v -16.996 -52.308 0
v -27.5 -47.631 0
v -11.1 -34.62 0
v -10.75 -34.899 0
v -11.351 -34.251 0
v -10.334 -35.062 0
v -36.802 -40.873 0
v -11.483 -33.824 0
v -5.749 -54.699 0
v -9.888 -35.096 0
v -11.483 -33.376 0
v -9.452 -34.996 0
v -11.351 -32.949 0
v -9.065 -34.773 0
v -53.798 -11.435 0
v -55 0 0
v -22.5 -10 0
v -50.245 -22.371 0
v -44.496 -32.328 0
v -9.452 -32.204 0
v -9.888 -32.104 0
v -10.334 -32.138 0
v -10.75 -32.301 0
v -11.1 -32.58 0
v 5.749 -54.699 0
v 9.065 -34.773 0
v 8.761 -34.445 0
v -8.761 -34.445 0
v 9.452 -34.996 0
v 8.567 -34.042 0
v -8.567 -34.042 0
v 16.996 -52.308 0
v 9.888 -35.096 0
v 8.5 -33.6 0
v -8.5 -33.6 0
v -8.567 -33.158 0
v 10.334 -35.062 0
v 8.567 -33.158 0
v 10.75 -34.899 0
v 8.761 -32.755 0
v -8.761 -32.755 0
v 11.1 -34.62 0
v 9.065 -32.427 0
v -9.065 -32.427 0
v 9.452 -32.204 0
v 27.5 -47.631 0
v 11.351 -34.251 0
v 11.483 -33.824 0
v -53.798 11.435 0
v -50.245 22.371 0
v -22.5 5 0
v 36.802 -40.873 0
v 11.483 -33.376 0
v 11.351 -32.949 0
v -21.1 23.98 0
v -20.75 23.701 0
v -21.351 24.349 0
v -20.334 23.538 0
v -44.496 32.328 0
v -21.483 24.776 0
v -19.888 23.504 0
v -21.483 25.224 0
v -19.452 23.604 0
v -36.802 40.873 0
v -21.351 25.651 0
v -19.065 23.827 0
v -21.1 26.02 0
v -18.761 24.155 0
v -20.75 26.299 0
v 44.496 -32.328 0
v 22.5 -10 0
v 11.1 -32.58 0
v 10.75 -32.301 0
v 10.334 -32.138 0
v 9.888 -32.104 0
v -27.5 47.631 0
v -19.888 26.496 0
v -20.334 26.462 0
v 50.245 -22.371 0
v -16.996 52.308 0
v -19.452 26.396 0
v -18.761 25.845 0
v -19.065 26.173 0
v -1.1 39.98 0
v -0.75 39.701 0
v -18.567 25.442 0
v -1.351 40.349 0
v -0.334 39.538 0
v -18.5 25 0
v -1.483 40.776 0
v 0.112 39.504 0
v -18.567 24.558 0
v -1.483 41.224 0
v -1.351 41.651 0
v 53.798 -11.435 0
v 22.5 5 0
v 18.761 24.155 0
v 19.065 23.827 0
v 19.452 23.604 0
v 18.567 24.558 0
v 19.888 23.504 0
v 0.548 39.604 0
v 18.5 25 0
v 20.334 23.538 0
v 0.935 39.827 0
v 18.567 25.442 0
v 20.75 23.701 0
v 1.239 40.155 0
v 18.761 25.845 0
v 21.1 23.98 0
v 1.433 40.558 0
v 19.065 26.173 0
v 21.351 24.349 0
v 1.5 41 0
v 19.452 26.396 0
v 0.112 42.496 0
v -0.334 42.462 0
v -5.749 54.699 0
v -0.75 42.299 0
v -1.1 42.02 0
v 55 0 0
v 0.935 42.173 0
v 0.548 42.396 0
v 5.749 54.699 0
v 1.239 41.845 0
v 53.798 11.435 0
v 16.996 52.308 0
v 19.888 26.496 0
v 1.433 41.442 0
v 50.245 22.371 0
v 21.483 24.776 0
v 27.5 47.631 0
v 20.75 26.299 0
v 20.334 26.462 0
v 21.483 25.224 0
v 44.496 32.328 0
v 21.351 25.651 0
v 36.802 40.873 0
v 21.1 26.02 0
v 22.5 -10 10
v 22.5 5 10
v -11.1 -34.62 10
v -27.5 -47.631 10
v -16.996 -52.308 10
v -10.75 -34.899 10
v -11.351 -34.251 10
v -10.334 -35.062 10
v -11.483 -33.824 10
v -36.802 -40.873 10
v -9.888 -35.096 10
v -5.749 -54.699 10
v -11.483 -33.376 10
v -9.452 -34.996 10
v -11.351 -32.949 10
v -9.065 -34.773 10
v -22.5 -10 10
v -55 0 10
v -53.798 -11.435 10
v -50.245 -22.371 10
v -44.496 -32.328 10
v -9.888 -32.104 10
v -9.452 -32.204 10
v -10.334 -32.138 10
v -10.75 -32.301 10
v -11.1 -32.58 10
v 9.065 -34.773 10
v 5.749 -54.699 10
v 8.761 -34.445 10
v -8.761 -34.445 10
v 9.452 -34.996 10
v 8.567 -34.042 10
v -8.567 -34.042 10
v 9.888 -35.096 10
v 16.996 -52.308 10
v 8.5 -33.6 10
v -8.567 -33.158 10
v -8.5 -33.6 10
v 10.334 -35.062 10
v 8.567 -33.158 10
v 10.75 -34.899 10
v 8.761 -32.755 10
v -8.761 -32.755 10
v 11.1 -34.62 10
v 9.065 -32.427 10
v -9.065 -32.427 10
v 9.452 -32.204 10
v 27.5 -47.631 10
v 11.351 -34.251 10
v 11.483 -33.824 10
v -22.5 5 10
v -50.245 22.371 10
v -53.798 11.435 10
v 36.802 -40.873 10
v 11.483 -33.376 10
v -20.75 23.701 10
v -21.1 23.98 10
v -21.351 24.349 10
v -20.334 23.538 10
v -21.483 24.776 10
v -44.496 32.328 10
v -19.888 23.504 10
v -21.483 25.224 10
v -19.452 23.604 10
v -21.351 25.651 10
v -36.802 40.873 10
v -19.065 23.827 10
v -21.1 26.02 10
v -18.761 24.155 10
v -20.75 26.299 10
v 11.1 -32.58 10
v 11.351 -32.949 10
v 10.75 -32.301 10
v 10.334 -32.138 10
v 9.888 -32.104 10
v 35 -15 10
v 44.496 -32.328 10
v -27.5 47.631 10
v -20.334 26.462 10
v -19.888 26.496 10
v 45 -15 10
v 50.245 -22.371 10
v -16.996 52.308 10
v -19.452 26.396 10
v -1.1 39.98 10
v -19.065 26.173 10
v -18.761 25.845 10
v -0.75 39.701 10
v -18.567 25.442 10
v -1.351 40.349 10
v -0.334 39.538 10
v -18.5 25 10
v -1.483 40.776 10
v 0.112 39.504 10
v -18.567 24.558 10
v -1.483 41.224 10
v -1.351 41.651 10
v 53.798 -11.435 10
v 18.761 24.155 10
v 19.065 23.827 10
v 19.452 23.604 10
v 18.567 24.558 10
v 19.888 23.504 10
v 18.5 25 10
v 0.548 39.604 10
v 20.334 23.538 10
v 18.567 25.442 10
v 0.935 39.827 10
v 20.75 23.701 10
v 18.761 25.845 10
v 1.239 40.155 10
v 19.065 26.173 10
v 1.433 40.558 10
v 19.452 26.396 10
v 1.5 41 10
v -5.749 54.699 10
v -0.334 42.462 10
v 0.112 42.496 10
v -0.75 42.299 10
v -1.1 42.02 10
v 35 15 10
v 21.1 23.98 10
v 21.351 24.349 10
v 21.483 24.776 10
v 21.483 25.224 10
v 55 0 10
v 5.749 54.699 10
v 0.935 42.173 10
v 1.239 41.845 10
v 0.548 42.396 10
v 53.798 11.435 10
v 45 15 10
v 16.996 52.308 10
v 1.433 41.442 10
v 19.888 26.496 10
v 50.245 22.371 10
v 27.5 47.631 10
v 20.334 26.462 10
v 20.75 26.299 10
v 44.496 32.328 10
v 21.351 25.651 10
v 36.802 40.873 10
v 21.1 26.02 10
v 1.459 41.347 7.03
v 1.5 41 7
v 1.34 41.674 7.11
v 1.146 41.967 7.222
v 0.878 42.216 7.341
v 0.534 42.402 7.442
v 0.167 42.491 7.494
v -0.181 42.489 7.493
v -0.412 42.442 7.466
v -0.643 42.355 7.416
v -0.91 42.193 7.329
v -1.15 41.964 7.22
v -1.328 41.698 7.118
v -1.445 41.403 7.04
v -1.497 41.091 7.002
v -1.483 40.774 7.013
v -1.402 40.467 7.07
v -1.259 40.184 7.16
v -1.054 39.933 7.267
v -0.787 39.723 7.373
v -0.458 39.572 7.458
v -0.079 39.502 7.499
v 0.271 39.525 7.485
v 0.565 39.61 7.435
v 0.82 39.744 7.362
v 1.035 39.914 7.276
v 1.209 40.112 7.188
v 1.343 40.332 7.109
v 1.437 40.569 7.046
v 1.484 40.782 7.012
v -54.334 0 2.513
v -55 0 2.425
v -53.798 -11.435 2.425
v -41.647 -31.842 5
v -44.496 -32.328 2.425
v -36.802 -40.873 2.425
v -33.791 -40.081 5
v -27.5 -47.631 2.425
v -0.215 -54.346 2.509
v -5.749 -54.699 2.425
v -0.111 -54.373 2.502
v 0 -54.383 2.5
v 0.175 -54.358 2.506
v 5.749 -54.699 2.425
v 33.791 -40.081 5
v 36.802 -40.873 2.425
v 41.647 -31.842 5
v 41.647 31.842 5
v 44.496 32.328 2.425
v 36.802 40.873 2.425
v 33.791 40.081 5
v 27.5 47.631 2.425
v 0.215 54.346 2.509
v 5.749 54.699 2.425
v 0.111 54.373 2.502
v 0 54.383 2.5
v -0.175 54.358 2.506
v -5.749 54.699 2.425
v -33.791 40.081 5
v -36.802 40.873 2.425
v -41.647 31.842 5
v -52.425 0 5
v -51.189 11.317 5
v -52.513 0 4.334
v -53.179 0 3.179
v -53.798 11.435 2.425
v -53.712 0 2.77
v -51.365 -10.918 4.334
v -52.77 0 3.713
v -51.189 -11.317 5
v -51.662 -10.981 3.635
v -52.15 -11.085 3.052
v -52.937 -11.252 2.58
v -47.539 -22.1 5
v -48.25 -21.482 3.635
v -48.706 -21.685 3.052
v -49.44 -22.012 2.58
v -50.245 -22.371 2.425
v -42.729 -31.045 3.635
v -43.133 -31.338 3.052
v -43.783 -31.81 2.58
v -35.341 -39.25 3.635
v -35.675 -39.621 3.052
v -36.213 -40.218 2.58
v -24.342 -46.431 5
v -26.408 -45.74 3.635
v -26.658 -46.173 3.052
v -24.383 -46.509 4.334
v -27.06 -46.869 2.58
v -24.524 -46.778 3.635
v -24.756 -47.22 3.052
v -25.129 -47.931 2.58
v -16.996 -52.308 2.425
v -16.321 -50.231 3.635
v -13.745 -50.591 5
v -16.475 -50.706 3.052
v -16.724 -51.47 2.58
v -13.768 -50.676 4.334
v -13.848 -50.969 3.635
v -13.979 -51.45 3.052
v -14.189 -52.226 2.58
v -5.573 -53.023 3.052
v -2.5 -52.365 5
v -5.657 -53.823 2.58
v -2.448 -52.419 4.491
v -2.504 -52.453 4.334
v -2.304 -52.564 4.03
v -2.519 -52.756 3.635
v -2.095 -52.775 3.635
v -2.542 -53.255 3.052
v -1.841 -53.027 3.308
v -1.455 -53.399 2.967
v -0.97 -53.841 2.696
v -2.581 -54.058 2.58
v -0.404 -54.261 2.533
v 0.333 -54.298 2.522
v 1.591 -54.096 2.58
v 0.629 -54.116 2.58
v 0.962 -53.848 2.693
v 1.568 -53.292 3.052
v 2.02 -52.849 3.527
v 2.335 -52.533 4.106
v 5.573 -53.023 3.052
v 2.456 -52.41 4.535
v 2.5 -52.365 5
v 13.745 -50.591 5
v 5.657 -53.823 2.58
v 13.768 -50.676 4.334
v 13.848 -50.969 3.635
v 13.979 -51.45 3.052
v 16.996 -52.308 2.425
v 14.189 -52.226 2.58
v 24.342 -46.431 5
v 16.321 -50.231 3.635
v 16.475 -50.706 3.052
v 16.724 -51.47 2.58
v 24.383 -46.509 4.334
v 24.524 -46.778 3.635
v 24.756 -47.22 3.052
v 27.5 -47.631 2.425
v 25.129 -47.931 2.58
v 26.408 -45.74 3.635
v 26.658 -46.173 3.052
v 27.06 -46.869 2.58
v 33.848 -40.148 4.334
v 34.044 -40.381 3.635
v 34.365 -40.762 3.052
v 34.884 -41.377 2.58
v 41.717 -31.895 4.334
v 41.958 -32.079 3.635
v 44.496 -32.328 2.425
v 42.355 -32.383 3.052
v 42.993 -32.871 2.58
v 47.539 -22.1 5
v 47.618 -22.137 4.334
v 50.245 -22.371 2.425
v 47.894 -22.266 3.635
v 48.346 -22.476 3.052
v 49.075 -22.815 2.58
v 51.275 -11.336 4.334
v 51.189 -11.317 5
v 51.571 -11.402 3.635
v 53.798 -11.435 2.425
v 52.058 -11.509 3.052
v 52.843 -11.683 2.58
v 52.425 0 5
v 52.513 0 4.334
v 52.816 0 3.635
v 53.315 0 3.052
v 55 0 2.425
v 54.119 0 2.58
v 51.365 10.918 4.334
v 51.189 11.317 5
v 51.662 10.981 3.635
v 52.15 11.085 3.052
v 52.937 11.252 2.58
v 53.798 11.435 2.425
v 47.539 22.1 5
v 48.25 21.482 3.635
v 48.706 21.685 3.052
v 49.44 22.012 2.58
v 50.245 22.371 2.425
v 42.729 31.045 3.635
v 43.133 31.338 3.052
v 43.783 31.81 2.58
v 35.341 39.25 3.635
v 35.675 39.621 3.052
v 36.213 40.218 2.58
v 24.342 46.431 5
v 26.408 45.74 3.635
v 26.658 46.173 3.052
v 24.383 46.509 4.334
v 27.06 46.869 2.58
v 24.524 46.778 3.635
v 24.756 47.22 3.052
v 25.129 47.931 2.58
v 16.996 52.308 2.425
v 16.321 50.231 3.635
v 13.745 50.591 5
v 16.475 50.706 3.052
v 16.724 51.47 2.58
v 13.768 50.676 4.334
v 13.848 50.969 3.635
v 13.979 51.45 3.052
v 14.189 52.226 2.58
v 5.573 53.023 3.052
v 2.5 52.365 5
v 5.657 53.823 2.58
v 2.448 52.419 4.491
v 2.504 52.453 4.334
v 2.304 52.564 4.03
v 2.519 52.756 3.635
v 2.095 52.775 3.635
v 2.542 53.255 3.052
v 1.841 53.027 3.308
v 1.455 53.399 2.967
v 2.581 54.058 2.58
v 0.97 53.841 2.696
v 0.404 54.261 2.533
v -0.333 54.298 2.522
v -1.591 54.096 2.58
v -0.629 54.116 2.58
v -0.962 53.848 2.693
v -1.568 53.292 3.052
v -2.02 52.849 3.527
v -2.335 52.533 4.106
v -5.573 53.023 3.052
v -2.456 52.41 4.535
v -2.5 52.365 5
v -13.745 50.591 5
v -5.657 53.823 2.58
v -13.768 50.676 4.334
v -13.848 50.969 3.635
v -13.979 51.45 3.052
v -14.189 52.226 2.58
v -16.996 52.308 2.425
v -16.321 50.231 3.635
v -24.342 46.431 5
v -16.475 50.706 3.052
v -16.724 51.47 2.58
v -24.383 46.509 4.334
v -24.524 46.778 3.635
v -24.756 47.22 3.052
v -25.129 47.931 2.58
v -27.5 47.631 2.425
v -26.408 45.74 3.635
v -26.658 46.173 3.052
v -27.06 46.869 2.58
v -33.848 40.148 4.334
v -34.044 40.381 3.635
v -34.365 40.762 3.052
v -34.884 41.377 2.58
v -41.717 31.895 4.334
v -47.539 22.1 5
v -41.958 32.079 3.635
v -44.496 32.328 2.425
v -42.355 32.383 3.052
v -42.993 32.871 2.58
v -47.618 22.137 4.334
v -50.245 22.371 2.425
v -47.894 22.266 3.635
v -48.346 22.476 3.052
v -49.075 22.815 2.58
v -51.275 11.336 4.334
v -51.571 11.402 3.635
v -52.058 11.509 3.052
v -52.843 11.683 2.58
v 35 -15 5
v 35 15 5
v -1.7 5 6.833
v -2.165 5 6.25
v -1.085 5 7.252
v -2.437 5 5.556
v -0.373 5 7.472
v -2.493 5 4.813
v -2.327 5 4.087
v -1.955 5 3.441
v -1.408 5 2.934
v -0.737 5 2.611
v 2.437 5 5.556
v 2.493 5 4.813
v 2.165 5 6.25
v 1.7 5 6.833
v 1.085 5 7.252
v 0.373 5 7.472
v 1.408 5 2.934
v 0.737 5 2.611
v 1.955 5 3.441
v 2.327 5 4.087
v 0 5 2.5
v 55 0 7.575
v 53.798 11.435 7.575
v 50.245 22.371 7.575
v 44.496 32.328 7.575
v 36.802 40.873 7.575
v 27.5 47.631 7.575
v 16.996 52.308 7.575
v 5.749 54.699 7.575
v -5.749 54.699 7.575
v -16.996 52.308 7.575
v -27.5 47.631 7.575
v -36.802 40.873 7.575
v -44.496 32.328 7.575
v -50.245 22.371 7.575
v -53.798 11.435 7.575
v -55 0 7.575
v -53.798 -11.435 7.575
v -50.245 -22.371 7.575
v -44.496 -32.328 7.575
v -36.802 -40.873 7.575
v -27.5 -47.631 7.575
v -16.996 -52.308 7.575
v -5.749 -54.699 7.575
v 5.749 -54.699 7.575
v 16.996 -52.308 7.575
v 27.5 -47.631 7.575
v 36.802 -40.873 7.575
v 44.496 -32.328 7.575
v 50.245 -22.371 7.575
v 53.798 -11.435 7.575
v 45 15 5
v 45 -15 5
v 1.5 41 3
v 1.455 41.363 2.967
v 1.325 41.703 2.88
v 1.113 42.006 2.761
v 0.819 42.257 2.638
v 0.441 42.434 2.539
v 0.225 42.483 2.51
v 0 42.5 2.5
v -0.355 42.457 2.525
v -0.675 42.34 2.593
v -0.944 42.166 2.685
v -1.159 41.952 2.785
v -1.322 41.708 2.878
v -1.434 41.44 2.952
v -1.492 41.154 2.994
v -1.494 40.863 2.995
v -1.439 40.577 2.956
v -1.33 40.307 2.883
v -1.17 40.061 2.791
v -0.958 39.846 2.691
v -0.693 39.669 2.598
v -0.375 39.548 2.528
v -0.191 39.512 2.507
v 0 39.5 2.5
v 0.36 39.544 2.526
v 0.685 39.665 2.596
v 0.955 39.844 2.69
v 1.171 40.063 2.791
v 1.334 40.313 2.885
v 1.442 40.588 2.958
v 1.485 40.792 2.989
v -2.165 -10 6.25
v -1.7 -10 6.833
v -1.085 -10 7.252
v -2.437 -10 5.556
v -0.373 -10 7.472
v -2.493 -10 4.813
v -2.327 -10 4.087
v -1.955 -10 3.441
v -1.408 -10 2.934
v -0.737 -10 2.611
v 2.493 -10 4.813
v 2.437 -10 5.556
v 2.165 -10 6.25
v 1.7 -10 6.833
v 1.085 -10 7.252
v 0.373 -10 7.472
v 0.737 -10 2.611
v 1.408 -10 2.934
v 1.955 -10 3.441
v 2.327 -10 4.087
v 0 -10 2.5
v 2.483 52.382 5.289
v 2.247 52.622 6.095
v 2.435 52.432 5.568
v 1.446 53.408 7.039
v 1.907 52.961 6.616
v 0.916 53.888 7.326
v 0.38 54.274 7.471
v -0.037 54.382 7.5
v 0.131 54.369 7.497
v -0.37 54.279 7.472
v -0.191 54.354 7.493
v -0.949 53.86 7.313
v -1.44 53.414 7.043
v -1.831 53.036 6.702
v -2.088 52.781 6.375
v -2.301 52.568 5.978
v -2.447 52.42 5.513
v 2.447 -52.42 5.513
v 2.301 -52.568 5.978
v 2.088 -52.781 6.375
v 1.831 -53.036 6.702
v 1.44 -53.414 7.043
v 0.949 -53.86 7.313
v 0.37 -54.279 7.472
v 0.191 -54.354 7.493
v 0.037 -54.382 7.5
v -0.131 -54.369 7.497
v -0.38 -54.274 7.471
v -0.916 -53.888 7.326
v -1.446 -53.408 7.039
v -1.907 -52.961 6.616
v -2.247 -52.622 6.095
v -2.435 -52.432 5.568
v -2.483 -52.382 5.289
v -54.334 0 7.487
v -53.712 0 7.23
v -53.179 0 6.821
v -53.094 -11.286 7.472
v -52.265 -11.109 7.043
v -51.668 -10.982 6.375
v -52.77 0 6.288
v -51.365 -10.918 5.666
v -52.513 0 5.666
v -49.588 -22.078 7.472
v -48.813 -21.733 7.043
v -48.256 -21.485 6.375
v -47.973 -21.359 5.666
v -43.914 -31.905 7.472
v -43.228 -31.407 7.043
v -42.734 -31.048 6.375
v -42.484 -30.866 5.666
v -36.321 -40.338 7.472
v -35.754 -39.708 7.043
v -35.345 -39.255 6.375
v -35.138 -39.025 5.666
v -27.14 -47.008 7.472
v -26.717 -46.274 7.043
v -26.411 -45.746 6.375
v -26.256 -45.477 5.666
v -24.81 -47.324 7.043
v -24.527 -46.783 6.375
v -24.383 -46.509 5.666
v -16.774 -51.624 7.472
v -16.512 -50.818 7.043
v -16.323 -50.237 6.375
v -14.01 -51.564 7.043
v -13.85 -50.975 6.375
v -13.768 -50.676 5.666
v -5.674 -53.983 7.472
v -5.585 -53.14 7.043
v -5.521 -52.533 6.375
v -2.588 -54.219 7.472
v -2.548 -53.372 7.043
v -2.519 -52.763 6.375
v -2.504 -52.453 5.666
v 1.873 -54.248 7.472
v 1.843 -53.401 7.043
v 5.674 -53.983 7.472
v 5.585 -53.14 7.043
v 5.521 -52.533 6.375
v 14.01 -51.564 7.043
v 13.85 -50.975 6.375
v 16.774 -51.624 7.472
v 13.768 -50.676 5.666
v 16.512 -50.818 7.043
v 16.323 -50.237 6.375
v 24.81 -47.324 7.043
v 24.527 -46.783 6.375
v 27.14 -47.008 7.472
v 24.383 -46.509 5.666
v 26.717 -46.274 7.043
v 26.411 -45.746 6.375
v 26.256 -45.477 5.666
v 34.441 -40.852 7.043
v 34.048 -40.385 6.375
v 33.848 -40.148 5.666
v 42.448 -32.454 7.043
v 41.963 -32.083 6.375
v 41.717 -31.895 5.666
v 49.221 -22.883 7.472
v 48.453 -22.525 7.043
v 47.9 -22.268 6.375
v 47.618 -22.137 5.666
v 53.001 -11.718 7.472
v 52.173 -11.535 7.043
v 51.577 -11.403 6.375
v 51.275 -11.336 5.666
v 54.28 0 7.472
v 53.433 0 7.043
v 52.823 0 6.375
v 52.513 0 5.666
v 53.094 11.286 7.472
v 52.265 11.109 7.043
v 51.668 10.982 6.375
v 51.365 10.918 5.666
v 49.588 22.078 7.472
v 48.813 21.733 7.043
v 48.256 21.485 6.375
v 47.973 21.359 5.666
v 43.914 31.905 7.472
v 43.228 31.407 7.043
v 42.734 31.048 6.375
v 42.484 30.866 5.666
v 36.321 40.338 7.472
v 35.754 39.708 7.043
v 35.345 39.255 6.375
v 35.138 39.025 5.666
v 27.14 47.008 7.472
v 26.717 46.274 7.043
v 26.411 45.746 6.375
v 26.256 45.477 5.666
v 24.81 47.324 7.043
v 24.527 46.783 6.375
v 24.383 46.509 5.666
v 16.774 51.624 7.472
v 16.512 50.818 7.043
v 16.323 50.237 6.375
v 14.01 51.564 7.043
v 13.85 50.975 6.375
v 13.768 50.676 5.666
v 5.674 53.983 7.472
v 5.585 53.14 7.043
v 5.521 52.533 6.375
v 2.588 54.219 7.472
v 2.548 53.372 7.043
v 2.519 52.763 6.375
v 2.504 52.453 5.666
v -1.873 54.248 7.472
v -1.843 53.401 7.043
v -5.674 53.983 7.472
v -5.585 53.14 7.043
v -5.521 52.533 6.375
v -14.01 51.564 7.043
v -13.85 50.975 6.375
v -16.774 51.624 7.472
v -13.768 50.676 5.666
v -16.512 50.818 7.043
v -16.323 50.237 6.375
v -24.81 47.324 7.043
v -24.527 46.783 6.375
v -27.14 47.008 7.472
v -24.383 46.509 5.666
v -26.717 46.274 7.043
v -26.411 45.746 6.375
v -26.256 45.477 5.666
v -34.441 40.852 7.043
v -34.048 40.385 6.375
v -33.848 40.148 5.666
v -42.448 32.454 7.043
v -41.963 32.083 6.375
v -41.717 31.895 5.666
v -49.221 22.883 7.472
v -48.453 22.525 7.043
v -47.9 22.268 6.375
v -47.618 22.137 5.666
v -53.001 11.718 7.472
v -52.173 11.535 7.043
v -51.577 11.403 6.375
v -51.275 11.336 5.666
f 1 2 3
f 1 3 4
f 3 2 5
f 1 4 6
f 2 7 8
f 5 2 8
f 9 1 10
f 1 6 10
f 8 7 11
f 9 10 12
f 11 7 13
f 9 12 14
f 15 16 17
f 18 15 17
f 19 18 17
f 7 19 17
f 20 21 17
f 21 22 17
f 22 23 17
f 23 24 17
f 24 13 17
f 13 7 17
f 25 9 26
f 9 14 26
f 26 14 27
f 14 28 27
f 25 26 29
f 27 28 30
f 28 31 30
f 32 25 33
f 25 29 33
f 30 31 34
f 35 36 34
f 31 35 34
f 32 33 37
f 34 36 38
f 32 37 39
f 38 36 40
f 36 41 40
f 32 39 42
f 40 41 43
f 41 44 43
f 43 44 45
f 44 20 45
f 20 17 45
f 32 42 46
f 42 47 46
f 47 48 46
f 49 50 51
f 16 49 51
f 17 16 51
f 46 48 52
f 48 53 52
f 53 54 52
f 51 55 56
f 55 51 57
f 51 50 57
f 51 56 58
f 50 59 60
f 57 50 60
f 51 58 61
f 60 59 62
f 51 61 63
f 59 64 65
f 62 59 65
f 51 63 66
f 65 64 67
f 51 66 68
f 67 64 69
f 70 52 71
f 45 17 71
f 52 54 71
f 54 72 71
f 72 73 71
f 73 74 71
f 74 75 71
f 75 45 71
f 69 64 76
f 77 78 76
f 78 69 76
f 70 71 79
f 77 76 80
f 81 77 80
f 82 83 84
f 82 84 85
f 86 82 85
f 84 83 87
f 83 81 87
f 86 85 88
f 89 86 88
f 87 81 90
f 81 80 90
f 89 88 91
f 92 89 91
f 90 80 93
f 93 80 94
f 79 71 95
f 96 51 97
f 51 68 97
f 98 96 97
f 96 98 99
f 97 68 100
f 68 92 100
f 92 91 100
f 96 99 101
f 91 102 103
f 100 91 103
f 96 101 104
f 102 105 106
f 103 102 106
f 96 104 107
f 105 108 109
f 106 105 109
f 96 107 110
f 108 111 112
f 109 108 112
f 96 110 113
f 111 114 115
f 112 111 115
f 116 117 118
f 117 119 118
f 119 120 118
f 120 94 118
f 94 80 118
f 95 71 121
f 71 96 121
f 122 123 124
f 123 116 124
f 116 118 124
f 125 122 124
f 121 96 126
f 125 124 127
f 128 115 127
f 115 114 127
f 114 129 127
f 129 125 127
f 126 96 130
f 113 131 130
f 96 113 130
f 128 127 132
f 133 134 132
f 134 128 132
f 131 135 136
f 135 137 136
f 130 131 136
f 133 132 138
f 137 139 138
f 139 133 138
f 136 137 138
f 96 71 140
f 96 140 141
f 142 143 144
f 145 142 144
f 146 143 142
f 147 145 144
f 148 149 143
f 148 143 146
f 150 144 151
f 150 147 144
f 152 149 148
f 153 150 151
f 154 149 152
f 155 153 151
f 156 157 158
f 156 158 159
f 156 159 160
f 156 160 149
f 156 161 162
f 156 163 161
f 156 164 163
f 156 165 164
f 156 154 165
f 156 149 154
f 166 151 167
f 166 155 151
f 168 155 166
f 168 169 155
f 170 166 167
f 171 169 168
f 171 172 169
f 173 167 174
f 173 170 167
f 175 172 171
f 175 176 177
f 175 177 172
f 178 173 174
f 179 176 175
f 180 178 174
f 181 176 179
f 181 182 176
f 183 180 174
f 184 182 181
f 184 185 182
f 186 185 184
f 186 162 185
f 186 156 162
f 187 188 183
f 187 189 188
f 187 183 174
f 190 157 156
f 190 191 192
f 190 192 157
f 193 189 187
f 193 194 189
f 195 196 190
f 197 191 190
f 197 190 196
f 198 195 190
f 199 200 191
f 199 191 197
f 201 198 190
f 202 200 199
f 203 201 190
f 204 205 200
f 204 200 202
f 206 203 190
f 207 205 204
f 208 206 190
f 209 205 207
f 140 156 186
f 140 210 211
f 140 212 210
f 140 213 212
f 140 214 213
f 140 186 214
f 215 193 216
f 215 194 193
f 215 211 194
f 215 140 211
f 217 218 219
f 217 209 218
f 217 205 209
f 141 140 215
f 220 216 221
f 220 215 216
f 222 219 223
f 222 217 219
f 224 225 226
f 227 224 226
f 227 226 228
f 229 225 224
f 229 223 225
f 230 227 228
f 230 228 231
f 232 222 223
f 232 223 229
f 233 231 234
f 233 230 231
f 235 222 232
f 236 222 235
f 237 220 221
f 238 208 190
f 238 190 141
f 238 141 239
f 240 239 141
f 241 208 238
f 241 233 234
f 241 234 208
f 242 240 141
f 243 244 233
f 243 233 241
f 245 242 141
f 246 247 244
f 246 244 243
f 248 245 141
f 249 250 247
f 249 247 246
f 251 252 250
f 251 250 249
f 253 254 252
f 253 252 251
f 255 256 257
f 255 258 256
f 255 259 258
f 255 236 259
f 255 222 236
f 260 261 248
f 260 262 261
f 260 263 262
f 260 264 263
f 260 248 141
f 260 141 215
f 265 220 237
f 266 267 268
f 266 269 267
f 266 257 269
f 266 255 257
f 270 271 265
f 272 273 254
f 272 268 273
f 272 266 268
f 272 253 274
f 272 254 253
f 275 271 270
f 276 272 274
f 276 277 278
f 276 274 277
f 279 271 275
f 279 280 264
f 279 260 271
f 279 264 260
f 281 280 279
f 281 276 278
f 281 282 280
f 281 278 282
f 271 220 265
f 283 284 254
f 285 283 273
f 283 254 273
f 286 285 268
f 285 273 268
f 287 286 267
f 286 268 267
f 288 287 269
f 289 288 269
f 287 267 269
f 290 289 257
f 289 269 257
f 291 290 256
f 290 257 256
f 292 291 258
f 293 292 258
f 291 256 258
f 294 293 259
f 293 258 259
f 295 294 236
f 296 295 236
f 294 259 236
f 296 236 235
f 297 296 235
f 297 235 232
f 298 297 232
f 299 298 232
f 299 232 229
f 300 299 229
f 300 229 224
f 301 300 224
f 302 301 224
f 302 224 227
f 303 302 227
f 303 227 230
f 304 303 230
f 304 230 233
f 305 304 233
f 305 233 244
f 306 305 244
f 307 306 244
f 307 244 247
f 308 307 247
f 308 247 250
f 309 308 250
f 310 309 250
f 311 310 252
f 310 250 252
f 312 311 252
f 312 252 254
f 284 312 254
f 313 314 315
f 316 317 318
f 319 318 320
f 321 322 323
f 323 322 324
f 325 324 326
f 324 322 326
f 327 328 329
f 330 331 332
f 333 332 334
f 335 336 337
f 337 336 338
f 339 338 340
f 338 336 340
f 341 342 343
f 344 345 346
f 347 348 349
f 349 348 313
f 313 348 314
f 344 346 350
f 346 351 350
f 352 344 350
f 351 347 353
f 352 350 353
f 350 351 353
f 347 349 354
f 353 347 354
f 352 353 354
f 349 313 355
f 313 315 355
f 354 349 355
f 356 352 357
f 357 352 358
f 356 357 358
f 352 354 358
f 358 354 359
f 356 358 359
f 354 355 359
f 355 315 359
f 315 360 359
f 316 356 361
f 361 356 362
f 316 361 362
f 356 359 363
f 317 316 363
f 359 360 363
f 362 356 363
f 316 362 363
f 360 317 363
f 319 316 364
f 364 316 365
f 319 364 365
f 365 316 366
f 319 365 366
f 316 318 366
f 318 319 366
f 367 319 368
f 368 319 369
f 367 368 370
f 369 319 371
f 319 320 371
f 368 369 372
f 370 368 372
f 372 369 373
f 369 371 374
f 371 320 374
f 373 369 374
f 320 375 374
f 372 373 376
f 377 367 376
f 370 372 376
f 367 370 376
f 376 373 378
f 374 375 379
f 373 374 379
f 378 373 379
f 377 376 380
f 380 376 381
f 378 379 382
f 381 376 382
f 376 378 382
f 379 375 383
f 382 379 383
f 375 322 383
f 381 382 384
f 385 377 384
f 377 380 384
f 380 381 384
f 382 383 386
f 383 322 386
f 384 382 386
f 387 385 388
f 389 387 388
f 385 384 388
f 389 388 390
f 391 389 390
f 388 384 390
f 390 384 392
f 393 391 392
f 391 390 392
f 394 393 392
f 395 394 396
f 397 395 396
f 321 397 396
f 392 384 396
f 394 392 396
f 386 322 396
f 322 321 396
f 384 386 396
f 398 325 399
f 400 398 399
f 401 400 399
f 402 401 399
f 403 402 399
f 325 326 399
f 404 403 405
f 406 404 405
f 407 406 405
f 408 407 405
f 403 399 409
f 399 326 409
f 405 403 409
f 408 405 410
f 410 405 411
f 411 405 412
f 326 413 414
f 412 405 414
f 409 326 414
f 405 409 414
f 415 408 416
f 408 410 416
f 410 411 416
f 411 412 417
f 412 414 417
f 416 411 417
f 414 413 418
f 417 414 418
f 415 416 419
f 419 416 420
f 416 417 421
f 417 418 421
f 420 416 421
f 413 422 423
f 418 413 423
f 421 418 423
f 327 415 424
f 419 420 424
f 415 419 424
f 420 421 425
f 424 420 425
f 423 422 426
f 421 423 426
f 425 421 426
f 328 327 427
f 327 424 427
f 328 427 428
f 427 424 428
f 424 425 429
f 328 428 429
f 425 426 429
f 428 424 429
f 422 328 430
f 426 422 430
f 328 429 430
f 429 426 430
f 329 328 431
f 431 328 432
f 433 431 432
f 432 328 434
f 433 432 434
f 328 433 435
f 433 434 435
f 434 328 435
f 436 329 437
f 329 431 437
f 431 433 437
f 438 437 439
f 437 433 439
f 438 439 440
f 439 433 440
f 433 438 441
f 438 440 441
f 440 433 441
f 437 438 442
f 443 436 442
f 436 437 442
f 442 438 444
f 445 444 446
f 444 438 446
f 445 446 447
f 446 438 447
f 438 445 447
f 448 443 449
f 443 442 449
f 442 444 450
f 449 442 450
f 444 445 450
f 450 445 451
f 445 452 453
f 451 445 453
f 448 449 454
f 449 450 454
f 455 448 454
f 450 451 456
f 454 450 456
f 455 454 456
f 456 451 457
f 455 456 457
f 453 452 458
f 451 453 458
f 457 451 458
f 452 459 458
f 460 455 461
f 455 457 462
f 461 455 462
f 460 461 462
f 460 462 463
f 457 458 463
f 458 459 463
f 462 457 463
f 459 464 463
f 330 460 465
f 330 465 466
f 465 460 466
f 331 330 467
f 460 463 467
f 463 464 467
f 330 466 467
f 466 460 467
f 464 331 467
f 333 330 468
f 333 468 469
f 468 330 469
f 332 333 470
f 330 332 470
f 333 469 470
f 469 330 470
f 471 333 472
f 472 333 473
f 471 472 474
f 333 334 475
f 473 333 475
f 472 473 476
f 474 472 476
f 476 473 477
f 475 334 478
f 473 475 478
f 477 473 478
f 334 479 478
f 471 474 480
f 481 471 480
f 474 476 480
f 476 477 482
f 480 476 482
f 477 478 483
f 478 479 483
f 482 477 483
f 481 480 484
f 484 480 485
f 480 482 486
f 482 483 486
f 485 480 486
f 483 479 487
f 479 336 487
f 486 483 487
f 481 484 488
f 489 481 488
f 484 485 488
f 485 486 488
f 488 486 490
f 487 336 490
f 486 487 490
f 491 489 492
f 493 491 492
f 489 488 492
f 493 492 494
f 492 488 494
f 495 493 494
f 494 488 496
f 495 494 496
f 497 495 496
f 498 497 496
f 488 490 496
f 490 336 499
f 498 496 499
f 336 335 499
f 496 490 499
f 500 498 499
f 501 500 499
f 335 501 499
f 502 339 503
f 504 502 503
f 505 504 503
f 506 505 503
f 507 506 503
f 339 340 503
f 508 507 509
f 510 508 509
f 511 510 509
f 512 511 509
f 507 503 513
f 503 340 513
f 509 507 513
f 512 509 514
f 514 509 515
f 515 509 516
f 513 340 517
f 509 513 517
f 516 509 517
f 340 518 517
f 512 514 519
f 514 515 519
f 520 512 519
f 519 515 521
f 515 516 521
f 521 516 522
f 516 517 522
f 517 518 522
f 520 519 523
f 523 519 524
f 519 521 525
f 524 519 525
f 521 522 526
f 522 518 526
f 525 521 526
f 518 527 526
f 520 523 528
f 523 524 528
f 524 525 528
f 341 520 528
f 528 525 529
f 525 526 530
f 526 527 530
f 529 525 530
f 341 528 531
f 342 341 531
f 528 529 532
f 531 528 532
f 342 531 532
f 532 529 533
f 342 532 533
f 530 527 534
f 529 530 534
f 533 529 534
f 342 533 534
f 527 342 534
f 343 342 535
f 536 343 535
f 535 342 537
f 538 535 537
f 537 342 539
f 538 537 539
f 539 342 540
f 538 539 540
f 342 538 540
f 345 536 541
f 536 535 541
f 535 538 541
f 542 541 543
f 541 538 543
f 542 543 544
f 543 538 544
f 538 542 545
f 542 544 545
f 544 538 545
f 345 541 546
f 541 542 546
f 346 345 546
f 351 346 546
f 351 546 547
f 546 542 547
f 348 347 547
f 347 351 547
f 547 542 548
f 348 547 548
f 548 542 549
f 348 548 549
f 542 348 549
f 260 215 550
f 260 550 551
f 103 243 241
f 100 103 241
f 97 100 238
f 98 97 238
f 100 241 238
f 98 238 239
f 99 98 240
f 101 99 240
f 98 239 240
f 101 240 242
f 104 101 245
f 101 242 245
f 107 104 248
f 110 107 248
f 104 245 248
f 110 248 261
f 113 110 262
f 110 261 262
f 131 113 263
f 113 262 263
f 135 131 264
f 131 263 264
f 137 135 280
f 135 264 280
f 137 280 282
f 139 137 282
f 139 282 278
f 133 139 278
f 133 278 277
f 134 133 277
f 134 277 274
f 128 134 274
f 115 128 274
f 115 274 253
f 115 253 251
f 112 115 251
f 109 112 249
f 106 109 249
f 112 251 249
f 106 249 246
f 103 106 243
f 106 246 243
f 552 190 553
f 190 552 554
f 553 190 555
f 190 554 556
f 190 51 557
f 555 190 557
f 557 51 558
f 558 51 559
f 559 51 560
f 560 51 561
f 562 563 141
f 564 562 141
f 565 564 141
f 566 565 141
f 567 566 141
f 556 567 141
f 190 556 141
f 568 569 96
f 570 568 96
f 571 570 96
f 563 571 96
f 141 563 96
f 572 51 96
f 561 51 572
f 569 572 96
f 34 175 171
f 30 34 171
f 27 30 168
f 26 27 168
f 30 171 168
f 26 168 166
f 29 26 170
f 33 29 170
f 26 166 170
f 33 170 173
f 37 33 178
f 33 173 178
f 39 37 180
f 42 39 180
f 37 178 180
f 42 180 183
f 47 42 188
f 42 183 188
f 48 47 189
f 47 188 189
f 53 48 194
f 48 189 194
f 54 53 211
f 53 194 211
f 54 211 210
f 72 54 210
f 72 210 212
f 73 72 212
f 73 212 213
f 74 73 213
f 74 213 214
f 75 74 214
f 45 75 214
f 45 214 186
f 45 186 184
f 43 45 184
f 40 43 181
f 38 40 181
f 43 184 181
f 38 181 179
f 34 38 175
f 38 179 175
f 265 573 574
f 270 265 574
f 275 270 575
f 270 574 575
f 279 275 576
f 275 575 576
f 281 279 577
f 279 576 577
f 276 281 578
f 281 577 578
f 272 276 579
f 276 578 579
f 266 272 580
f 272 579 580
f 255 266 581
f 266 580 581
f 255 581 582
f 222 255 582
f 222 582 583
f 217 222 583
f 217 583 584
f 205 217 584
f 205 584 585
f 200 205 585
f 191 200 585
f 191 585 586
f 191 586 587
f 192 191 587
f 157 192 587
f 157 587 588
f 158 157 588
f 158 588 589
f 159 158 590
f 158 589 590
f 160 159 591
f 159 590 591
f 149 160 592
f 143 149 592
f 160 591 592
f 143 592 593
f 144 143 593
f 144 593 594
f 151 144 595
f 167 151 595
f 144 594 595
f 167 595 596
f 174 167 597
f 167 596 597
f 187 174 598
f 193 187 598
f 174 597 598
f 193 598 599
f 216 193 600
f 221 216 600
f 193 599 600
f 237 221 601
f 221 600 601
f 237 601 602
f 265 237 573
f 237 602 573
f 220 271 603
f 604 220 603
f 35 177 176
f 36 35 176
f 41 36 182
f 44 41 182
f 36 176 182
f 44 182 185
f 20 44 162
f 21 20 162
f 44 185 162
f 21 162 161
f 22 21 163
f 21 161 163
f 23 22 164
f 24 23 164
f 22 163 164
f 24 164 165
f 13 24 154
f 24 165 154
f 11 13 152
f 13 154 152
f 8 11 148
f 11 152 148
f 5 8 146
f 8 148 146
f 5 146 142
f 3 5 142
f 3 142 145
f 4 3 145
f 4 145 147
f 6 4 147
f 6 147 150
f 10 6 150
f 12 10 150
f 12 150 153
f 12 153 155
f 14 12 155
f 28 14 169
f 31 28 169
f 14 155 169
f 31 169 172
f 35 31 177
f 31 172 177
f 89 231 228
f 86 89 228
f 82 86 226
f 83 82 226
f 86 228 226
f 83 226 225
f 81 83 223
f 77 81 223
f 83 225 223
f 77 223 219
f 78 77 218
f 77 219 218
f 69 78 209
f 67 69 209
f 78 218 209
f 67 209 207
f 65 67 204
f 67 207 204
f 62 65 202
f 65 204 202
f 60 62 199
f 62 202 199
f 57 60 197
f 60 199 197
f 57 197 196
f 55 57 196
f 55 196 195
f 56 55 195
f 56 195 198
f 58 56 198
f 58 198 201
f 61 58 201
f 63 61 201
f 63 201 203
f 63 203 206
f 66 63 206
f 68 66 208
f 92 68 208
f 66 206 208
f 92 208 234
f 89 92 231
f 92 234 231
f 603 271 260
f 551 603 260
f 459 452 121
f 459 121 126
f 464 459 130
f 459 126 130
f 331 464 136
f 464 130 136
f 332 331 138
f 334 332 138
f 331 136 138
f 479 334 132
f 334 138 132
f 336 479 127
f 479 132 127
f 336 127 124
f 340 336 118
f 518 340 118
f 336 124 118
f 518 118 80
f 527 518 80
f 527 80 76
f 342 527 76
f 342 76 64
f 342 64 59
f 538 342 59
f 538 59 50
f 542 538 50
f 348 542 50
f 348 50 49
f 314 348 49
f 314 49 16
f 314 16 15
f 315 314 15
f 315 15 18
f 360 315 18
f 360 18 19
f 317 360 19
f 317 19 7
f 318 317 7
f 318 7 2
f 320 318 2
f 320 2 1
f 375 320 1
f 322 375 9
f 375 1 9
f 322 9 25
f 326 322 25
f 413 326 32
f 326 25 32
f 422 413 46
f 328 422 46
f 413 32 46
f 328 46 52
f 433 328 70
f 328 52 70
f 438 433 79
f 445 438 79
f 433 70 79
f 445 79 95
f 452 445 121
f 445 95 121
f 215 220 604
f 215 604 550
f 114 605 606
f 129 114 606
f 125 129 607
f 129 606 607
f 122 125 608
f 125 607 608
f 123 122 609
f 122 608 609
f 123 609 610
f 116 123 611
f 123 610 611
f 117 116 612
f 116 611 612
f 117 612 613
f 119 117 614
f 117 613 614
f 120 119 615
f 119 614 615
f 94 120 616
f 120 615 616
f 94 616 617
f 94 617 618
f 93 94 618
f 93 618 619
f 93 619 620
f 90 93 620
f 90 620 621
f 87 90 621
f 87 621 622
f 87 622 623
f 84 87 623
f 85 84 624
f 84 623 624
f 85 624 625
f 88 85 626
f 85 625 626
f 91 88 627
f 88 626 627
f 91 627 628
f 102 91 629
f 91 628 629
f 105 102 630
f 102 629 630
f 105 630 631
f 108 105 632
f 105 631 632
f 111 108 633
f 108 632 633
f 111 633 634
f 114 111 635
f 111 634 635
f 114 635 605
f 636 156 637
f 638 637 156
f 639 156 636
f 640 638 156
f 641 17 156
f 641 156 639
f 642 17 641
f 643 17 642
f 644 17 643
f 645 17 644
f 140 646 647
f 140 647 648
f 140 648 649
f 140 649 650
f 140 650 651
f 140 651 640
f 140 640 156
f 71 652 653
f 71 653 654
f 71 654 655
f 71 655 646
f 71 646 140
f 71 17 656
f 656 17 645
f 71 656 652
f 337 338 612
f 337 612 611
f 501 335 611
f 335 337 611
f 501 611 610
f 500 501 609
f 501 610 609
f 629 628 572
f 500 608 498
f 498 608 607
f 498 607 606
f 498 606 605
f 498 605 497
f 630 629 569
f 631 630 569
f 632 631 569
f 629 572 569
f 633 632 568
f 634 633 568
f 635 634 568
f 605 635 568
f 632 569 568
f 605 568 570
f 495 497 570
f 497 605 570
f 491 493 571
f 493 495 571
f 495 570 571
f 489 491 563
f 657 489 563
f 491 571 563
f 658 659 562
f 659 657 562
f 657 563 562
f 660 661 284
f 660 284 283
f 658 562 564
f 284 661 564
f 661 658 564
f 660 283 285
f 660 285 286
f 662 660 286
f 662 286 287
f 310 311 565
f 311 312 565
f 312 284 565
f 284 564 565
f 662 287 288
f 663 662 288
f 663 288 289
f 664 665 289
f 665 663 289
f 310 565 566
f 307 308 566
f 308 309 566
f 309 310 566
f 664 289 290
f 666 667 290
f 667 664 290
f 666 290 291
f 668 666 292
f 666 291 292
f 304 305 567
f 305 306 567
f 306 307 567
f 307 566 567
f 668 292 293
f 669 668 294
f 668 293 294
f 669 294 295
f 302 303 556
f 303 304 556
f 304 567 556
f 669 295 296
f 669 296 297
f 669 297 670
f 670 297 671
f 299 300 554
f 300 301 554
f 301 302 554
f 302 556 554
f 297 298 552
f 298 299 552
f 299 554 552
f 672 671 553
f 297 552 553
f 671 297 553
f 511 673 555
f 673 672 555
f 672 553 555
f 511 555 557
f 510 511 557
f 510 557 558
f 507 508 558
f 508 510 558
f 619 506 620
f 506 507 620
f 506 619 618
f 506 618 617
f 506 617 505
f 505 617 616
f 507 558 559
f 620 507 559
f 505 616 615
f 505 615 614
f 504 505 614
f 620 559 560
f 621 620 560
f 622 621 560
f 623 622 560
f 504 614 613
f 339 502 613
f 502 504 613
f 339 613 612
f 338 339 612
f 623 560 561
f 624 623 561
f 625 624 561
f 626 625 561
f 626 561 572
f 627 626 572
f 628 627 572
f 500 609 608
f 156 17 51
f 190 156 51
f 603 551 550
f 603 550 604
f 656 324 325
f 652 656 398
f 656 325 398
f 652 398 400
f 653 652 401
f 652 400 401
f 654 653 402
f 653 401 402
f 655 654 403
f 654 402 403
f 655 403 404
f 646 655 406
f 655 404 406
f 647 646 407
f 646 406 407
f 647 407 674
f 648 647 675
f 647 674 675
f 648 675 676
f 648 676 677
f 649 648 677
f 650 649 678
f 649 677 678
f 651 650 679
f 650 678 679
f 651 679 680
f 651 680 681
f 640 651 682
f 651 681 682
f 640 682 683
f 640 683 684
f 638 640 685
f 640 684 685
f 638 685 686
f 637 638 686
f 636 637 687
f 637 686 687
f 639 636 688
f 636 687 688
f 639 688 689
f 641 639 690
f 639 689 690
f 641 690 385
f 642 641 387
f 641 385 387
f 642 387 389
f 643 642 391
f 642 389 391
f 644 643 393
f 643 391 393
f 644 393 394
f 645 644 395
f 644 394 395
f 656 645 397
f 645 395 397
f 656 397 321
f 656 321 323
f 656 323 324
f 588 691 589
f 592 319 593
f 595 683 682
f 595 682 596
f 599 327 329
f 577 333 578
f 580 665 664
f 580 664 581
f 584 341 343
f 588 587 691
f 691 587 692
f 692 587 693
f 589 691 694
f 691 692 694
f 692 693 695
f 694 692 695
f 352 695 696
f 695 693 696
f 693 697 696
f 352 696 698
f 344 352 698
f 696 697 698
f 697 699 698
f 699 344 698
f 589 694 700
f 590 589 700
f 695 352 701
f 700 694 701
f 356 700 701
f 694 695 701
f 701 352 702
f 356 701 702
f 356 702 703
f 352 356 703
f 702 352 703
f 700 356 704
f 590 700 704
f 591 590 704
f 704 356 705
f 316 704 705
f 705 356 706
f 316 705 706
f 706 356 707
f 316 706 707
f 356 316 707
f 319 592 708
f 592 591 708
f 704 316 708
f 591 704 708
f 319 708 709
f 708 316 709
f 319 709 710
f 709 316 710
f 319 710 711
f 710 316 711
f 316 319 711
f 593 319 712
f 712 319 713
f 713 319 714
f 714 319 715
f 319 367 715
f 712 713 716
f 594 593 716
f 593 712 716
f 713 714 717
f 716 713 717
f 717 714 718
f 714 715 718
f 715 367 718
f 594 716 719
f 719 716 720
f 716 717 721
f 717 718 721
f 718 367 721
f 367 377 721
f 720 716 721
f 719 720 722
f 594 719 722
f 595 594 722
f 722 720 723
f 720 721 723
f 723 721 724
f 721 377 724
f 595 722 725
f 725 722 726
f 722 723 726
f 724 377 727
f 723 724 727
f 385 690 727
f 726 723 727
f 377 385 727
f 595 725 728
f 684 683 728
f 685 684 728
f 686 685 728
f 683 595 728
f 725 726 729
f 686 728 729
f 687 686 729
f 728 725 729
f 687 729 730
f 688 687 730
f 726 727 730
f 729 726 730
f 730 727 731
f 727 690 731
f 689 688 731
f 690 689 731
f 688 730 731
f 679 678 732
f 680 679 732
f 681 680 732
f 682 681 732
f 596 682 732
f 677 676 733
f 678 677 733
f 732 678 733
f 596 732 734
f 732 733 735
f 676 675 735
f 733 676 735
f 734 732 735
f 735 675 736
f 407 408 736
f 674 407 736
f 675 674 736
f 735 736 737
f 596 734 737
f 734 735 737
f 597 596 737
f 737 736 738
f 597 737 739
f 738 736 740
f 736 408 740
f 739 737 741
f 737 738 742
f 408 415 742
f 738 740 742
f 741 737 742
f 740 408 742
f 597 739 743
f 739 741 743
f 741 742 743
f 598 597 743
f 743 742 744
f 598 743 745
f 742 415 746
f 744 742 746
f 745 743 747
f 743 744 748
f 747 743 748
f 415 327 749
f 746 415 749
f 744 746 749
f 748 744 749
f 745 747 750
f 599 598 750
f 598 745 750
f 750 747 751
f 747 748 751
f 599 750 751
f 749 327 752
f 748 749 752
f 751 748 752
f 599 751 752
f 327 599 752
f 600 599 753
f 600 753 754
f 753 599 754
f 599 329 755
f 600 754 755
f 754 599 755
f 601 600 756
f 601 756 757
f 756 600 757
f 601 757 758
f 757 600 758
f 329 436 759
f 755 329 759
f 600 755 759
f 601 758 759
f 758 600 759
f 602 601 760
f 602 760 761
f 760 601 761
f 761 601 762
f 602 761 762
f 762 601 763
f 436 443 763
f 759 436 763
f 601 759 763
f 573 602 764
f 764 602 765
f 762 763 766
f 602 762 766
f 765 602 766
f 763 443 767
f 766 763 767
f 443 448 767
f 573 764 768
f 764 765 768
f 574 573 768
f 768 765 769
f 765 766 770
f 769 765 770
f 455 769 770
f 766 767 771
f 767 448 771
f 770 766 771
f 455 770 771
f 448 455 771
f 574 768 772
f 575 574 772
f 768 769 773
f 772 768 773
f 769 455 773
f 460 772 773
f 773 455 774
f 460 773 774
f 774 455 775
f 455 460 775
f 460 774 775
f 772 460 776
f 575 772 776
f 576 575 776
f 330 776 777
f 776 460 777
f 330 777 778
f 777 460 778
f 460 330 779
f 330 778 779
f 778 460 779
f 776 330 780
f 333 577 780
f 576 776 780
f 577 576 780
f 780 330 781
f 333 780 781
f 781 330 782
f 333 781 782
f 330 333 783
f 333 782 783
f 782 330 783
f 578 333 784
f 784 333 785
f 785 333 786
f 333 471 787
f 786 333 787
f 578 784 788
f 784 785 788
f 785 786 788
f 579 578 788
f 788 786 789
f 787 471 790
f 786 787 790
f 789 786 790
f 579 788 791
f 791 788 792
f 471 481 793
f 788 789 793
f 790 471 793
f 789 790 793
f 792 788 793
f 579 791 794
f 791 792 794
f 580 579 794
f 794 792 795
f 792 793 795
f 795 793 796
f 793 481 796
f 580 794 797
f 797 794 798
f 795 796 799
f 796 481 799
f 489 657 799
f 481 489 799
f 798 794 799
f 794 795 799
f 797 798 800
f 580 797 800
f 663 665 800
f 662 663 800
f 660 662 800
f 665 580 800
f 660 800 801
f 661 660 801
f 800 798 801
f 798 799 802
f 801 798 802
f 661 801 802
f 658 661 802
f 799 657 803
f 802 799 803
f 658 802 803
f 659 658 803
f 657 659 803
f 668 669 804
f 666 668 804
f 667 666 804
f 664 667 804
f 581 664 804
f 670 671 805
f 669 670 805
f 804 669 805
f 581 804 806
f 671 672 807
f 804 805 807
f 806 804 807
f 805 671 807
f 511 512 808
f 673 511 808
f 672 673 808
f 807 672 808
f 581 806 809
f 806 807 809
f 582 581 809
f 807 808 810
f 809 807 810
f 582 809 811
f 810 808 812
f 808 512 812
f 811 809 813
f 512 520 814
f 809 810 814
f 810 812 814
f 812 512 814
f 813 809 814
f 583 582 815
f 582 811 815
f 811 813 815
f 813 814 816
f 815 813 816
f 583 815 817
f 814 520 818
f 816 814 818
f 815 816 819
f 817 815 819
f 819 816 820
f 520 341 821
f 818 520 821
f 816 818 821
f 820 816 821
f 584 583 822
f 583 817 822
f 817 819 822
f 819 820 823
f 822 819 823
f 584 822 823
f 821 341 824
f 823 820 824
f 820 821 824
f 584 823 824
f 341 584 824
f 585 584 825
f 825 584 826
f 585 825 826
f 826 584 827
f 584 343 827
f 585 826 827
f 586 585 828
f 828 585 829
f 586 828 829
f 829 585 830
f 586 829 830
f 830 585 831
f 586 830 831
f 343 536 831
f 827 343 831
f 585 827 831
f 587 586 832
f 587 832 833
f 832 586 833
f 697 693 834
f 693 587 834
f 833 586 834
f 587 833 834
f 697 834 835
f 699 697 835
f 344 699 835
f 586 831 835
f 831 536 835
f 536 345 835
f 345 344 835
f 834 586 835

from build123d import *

# Parameters (mm, degrees)
CROQUIS1_R              = 55
CROQUIS1_W              = 45
CROQUIS1_H              = 15
SALIENTE_EXTRUIR1_DEPTH = 10
CROQUIS2_W              = 10
CROQUIS2_H              = 30
SALIENTE_EXTRUIR2_DEPTH = 65
CROQUIS3_R              = 1.5
CORTAR_EXTRUIR1_DEPTH   = 50
CORTAR_EXTRUIR2_DEPTH   = 10
CROQUIS5_R              = 2.5
CORTAR_EXTRUIR3_DEPTH   = 85
CROQUIS8_R              = 1.5
CORTAR_EXTRUIR4_DEPTH   = 10
CROQUIS10_R             = 2.575
CROQUIS11_W             = 10
CROQUIS11_H             = 70
CORTAR_EXTRUIR5_DEPTH   = 30
CORTAR_EXTRUIR6_DEPTH   = 30
SALIENTE_EXTRUIR4_REACH = 80.422
CROQUIS13_W             = 10
CROQUIS13_H             = 30
CROQUIS7_R              = 1.5
CORTAR_EXTRUIR9_DEPTH   = 10


with BuildPart() as part:
    # Croquis1 → Saliente-Extruir1 (new body)
    with BuildSketch(Plane.XY):
        Circle(CROQUIS1_R)
        with Locations((0, -2.5)):
            Rectangle(CROQUIS1_W, CROQUIS1_H, mode=Mode.SUBTRACT)
    extrude(amount=SALIENTE_EXTRUIR1_DEPTH)

    # Croquis2 → Saliente-Extruir2 (add)
    with BuildSketch(Plane.XY.offset(10)):
        with Locations((30, 0)):
            Rectangle(CROQUIS2_W, CROQUIS2_H)
    extrude(amount=SALIENTE_EXTRUIR2_DEPTH)

    # Croquis3 → Cortar-Extruir1 (cut)
    with BuildSketch(Plane.XZ.offset(15)):
        with Locations((30, 70)):
            Circle(CROQUIS3_R)
    extrude(amount=-CORTAR_EXTRUIR1_DEPTH, mode=Mode.SUBTRACT)

    # Croquis4 → Cortar-Extruir2 (cut)
    with BuildSketch(Plane.XZ.offset(15)):
        Polygon((35, 65), (25, 42.602429787), (25, 65), (25, 75), (35, 75), align=None)
    cortar_extruir2 = extrude(amount=-CORTAR_EXTRUIR2_DEPTH, mode=Mode.SUBTRACT)

    # Simetría1: Cortar-Extruir2 across plane
    add(cortar_extruir2.mirror(Plane.ZX), mode=Mode.SUBTRACT)

    # Croquis5 → Cortar-Extruir3 (cut, symmetric)
    with BuildSketch(Plane.XZ.offset(-5)):
        with Locations(Location((0, 5, 0), (0, 0, 270))):
            Circle(CROQUIS5_R)
    extrude(amount=CORTAR_EXTRUIR3_DEPTH, both=True, mode=Mode.SUBTRACT)

    # Croquis8 → Cortar-Extruir4 (cut)
    with BuildSketch(Plane.XY.offset(10)):
        with Locations(Location((9.999999991, -33.6, 0), (0, 0, 180))):
            Circle(CROQUIS8_R)
        with Locations(Location((19.999999995, 25, 0), (0, 0, 180))):
            Circle(CROQUIS8_R)
        with Locations((-20.000000005, 25)):
            Circle(CROQUIS8_R)
        with Locations((-10, -33.6)):
            Circle(CROQUIS8_R)
    extrude(amount=-CORTAR_EXTRUIR4_DEPTH, mode=Mode.SUBTRACT)

    # Croquis10 → Cortar-Revolución1 (revolve, cut)
    with BuildSketch(Plane(origin=(0, 0, 0), x_dir=(1, 0, 0), z_dir=(0, 1, 0))):
        with Locations((-55, -5)):
            Circle(CROQUIS10_R)
    revolve(axis=Axis((0, 0, 0), (0, 0, 1)), mode=Mode.SUBTRACT)

    # Croquis11 → Cortar-Extruir5 (cut)
    with BuildSketch(Plane(origin=(0, 15, 0), x_dir=(1, 0, 0), z_dir=(0, 1, 0))):
        with Locations((30, -40)):
            Rectangle(CROQUIS11_W, CROQUIS11_H)
    extrude(amount=-CORTAR_EXTRUIR5_DEPTH, mode=Mode.SUBTRACT)

    # Croquis12 → Cortar-Extruir6 (cut)
    with BuildSketch(Plane.XZ.offset(-15)):
        Polygon((35, 10), (45, 10), (45, 5), (35, 5), (25, 5), (25, 10), align=None)
    extrude(amount=CORTAR_EXTRUIR6_DEPTH, mode=Mode.SUBTRACT)

    # Croquis13 → Saliente-Extruir4 (add, up to next)
    with BuildSketch(Plane.XY.offset(10), mode=Mode.PRIVATE) as saliente_extruir4_sk1:
        with Locations((30, 0)):
            Rectangle(CROQUIS13_W, CROQUIS13_H)
    saliente_extruir4_tool1 = extrude(saliente_extruir4_sk1.sketch, amount=-SALIENTE_EXTRUIR4_REACH, mode=Mode.PRIVATE) - part.part
    add(saliente_extruir4_tool1.solids().sort_by_distance((30, 0, 10))[0])

    # Croquis7 → Cortar-Extruir9 (cut)
    with BuildSketch(Plane.XY.offset(10)):
        with Locations((0, 41)):
            Circle(CROQUIS7_R)
    extrude(amount=-CORTAR_EXTRUIR9_DEPTH, mode=Mode.SUBTRACT)


solid = part.part
